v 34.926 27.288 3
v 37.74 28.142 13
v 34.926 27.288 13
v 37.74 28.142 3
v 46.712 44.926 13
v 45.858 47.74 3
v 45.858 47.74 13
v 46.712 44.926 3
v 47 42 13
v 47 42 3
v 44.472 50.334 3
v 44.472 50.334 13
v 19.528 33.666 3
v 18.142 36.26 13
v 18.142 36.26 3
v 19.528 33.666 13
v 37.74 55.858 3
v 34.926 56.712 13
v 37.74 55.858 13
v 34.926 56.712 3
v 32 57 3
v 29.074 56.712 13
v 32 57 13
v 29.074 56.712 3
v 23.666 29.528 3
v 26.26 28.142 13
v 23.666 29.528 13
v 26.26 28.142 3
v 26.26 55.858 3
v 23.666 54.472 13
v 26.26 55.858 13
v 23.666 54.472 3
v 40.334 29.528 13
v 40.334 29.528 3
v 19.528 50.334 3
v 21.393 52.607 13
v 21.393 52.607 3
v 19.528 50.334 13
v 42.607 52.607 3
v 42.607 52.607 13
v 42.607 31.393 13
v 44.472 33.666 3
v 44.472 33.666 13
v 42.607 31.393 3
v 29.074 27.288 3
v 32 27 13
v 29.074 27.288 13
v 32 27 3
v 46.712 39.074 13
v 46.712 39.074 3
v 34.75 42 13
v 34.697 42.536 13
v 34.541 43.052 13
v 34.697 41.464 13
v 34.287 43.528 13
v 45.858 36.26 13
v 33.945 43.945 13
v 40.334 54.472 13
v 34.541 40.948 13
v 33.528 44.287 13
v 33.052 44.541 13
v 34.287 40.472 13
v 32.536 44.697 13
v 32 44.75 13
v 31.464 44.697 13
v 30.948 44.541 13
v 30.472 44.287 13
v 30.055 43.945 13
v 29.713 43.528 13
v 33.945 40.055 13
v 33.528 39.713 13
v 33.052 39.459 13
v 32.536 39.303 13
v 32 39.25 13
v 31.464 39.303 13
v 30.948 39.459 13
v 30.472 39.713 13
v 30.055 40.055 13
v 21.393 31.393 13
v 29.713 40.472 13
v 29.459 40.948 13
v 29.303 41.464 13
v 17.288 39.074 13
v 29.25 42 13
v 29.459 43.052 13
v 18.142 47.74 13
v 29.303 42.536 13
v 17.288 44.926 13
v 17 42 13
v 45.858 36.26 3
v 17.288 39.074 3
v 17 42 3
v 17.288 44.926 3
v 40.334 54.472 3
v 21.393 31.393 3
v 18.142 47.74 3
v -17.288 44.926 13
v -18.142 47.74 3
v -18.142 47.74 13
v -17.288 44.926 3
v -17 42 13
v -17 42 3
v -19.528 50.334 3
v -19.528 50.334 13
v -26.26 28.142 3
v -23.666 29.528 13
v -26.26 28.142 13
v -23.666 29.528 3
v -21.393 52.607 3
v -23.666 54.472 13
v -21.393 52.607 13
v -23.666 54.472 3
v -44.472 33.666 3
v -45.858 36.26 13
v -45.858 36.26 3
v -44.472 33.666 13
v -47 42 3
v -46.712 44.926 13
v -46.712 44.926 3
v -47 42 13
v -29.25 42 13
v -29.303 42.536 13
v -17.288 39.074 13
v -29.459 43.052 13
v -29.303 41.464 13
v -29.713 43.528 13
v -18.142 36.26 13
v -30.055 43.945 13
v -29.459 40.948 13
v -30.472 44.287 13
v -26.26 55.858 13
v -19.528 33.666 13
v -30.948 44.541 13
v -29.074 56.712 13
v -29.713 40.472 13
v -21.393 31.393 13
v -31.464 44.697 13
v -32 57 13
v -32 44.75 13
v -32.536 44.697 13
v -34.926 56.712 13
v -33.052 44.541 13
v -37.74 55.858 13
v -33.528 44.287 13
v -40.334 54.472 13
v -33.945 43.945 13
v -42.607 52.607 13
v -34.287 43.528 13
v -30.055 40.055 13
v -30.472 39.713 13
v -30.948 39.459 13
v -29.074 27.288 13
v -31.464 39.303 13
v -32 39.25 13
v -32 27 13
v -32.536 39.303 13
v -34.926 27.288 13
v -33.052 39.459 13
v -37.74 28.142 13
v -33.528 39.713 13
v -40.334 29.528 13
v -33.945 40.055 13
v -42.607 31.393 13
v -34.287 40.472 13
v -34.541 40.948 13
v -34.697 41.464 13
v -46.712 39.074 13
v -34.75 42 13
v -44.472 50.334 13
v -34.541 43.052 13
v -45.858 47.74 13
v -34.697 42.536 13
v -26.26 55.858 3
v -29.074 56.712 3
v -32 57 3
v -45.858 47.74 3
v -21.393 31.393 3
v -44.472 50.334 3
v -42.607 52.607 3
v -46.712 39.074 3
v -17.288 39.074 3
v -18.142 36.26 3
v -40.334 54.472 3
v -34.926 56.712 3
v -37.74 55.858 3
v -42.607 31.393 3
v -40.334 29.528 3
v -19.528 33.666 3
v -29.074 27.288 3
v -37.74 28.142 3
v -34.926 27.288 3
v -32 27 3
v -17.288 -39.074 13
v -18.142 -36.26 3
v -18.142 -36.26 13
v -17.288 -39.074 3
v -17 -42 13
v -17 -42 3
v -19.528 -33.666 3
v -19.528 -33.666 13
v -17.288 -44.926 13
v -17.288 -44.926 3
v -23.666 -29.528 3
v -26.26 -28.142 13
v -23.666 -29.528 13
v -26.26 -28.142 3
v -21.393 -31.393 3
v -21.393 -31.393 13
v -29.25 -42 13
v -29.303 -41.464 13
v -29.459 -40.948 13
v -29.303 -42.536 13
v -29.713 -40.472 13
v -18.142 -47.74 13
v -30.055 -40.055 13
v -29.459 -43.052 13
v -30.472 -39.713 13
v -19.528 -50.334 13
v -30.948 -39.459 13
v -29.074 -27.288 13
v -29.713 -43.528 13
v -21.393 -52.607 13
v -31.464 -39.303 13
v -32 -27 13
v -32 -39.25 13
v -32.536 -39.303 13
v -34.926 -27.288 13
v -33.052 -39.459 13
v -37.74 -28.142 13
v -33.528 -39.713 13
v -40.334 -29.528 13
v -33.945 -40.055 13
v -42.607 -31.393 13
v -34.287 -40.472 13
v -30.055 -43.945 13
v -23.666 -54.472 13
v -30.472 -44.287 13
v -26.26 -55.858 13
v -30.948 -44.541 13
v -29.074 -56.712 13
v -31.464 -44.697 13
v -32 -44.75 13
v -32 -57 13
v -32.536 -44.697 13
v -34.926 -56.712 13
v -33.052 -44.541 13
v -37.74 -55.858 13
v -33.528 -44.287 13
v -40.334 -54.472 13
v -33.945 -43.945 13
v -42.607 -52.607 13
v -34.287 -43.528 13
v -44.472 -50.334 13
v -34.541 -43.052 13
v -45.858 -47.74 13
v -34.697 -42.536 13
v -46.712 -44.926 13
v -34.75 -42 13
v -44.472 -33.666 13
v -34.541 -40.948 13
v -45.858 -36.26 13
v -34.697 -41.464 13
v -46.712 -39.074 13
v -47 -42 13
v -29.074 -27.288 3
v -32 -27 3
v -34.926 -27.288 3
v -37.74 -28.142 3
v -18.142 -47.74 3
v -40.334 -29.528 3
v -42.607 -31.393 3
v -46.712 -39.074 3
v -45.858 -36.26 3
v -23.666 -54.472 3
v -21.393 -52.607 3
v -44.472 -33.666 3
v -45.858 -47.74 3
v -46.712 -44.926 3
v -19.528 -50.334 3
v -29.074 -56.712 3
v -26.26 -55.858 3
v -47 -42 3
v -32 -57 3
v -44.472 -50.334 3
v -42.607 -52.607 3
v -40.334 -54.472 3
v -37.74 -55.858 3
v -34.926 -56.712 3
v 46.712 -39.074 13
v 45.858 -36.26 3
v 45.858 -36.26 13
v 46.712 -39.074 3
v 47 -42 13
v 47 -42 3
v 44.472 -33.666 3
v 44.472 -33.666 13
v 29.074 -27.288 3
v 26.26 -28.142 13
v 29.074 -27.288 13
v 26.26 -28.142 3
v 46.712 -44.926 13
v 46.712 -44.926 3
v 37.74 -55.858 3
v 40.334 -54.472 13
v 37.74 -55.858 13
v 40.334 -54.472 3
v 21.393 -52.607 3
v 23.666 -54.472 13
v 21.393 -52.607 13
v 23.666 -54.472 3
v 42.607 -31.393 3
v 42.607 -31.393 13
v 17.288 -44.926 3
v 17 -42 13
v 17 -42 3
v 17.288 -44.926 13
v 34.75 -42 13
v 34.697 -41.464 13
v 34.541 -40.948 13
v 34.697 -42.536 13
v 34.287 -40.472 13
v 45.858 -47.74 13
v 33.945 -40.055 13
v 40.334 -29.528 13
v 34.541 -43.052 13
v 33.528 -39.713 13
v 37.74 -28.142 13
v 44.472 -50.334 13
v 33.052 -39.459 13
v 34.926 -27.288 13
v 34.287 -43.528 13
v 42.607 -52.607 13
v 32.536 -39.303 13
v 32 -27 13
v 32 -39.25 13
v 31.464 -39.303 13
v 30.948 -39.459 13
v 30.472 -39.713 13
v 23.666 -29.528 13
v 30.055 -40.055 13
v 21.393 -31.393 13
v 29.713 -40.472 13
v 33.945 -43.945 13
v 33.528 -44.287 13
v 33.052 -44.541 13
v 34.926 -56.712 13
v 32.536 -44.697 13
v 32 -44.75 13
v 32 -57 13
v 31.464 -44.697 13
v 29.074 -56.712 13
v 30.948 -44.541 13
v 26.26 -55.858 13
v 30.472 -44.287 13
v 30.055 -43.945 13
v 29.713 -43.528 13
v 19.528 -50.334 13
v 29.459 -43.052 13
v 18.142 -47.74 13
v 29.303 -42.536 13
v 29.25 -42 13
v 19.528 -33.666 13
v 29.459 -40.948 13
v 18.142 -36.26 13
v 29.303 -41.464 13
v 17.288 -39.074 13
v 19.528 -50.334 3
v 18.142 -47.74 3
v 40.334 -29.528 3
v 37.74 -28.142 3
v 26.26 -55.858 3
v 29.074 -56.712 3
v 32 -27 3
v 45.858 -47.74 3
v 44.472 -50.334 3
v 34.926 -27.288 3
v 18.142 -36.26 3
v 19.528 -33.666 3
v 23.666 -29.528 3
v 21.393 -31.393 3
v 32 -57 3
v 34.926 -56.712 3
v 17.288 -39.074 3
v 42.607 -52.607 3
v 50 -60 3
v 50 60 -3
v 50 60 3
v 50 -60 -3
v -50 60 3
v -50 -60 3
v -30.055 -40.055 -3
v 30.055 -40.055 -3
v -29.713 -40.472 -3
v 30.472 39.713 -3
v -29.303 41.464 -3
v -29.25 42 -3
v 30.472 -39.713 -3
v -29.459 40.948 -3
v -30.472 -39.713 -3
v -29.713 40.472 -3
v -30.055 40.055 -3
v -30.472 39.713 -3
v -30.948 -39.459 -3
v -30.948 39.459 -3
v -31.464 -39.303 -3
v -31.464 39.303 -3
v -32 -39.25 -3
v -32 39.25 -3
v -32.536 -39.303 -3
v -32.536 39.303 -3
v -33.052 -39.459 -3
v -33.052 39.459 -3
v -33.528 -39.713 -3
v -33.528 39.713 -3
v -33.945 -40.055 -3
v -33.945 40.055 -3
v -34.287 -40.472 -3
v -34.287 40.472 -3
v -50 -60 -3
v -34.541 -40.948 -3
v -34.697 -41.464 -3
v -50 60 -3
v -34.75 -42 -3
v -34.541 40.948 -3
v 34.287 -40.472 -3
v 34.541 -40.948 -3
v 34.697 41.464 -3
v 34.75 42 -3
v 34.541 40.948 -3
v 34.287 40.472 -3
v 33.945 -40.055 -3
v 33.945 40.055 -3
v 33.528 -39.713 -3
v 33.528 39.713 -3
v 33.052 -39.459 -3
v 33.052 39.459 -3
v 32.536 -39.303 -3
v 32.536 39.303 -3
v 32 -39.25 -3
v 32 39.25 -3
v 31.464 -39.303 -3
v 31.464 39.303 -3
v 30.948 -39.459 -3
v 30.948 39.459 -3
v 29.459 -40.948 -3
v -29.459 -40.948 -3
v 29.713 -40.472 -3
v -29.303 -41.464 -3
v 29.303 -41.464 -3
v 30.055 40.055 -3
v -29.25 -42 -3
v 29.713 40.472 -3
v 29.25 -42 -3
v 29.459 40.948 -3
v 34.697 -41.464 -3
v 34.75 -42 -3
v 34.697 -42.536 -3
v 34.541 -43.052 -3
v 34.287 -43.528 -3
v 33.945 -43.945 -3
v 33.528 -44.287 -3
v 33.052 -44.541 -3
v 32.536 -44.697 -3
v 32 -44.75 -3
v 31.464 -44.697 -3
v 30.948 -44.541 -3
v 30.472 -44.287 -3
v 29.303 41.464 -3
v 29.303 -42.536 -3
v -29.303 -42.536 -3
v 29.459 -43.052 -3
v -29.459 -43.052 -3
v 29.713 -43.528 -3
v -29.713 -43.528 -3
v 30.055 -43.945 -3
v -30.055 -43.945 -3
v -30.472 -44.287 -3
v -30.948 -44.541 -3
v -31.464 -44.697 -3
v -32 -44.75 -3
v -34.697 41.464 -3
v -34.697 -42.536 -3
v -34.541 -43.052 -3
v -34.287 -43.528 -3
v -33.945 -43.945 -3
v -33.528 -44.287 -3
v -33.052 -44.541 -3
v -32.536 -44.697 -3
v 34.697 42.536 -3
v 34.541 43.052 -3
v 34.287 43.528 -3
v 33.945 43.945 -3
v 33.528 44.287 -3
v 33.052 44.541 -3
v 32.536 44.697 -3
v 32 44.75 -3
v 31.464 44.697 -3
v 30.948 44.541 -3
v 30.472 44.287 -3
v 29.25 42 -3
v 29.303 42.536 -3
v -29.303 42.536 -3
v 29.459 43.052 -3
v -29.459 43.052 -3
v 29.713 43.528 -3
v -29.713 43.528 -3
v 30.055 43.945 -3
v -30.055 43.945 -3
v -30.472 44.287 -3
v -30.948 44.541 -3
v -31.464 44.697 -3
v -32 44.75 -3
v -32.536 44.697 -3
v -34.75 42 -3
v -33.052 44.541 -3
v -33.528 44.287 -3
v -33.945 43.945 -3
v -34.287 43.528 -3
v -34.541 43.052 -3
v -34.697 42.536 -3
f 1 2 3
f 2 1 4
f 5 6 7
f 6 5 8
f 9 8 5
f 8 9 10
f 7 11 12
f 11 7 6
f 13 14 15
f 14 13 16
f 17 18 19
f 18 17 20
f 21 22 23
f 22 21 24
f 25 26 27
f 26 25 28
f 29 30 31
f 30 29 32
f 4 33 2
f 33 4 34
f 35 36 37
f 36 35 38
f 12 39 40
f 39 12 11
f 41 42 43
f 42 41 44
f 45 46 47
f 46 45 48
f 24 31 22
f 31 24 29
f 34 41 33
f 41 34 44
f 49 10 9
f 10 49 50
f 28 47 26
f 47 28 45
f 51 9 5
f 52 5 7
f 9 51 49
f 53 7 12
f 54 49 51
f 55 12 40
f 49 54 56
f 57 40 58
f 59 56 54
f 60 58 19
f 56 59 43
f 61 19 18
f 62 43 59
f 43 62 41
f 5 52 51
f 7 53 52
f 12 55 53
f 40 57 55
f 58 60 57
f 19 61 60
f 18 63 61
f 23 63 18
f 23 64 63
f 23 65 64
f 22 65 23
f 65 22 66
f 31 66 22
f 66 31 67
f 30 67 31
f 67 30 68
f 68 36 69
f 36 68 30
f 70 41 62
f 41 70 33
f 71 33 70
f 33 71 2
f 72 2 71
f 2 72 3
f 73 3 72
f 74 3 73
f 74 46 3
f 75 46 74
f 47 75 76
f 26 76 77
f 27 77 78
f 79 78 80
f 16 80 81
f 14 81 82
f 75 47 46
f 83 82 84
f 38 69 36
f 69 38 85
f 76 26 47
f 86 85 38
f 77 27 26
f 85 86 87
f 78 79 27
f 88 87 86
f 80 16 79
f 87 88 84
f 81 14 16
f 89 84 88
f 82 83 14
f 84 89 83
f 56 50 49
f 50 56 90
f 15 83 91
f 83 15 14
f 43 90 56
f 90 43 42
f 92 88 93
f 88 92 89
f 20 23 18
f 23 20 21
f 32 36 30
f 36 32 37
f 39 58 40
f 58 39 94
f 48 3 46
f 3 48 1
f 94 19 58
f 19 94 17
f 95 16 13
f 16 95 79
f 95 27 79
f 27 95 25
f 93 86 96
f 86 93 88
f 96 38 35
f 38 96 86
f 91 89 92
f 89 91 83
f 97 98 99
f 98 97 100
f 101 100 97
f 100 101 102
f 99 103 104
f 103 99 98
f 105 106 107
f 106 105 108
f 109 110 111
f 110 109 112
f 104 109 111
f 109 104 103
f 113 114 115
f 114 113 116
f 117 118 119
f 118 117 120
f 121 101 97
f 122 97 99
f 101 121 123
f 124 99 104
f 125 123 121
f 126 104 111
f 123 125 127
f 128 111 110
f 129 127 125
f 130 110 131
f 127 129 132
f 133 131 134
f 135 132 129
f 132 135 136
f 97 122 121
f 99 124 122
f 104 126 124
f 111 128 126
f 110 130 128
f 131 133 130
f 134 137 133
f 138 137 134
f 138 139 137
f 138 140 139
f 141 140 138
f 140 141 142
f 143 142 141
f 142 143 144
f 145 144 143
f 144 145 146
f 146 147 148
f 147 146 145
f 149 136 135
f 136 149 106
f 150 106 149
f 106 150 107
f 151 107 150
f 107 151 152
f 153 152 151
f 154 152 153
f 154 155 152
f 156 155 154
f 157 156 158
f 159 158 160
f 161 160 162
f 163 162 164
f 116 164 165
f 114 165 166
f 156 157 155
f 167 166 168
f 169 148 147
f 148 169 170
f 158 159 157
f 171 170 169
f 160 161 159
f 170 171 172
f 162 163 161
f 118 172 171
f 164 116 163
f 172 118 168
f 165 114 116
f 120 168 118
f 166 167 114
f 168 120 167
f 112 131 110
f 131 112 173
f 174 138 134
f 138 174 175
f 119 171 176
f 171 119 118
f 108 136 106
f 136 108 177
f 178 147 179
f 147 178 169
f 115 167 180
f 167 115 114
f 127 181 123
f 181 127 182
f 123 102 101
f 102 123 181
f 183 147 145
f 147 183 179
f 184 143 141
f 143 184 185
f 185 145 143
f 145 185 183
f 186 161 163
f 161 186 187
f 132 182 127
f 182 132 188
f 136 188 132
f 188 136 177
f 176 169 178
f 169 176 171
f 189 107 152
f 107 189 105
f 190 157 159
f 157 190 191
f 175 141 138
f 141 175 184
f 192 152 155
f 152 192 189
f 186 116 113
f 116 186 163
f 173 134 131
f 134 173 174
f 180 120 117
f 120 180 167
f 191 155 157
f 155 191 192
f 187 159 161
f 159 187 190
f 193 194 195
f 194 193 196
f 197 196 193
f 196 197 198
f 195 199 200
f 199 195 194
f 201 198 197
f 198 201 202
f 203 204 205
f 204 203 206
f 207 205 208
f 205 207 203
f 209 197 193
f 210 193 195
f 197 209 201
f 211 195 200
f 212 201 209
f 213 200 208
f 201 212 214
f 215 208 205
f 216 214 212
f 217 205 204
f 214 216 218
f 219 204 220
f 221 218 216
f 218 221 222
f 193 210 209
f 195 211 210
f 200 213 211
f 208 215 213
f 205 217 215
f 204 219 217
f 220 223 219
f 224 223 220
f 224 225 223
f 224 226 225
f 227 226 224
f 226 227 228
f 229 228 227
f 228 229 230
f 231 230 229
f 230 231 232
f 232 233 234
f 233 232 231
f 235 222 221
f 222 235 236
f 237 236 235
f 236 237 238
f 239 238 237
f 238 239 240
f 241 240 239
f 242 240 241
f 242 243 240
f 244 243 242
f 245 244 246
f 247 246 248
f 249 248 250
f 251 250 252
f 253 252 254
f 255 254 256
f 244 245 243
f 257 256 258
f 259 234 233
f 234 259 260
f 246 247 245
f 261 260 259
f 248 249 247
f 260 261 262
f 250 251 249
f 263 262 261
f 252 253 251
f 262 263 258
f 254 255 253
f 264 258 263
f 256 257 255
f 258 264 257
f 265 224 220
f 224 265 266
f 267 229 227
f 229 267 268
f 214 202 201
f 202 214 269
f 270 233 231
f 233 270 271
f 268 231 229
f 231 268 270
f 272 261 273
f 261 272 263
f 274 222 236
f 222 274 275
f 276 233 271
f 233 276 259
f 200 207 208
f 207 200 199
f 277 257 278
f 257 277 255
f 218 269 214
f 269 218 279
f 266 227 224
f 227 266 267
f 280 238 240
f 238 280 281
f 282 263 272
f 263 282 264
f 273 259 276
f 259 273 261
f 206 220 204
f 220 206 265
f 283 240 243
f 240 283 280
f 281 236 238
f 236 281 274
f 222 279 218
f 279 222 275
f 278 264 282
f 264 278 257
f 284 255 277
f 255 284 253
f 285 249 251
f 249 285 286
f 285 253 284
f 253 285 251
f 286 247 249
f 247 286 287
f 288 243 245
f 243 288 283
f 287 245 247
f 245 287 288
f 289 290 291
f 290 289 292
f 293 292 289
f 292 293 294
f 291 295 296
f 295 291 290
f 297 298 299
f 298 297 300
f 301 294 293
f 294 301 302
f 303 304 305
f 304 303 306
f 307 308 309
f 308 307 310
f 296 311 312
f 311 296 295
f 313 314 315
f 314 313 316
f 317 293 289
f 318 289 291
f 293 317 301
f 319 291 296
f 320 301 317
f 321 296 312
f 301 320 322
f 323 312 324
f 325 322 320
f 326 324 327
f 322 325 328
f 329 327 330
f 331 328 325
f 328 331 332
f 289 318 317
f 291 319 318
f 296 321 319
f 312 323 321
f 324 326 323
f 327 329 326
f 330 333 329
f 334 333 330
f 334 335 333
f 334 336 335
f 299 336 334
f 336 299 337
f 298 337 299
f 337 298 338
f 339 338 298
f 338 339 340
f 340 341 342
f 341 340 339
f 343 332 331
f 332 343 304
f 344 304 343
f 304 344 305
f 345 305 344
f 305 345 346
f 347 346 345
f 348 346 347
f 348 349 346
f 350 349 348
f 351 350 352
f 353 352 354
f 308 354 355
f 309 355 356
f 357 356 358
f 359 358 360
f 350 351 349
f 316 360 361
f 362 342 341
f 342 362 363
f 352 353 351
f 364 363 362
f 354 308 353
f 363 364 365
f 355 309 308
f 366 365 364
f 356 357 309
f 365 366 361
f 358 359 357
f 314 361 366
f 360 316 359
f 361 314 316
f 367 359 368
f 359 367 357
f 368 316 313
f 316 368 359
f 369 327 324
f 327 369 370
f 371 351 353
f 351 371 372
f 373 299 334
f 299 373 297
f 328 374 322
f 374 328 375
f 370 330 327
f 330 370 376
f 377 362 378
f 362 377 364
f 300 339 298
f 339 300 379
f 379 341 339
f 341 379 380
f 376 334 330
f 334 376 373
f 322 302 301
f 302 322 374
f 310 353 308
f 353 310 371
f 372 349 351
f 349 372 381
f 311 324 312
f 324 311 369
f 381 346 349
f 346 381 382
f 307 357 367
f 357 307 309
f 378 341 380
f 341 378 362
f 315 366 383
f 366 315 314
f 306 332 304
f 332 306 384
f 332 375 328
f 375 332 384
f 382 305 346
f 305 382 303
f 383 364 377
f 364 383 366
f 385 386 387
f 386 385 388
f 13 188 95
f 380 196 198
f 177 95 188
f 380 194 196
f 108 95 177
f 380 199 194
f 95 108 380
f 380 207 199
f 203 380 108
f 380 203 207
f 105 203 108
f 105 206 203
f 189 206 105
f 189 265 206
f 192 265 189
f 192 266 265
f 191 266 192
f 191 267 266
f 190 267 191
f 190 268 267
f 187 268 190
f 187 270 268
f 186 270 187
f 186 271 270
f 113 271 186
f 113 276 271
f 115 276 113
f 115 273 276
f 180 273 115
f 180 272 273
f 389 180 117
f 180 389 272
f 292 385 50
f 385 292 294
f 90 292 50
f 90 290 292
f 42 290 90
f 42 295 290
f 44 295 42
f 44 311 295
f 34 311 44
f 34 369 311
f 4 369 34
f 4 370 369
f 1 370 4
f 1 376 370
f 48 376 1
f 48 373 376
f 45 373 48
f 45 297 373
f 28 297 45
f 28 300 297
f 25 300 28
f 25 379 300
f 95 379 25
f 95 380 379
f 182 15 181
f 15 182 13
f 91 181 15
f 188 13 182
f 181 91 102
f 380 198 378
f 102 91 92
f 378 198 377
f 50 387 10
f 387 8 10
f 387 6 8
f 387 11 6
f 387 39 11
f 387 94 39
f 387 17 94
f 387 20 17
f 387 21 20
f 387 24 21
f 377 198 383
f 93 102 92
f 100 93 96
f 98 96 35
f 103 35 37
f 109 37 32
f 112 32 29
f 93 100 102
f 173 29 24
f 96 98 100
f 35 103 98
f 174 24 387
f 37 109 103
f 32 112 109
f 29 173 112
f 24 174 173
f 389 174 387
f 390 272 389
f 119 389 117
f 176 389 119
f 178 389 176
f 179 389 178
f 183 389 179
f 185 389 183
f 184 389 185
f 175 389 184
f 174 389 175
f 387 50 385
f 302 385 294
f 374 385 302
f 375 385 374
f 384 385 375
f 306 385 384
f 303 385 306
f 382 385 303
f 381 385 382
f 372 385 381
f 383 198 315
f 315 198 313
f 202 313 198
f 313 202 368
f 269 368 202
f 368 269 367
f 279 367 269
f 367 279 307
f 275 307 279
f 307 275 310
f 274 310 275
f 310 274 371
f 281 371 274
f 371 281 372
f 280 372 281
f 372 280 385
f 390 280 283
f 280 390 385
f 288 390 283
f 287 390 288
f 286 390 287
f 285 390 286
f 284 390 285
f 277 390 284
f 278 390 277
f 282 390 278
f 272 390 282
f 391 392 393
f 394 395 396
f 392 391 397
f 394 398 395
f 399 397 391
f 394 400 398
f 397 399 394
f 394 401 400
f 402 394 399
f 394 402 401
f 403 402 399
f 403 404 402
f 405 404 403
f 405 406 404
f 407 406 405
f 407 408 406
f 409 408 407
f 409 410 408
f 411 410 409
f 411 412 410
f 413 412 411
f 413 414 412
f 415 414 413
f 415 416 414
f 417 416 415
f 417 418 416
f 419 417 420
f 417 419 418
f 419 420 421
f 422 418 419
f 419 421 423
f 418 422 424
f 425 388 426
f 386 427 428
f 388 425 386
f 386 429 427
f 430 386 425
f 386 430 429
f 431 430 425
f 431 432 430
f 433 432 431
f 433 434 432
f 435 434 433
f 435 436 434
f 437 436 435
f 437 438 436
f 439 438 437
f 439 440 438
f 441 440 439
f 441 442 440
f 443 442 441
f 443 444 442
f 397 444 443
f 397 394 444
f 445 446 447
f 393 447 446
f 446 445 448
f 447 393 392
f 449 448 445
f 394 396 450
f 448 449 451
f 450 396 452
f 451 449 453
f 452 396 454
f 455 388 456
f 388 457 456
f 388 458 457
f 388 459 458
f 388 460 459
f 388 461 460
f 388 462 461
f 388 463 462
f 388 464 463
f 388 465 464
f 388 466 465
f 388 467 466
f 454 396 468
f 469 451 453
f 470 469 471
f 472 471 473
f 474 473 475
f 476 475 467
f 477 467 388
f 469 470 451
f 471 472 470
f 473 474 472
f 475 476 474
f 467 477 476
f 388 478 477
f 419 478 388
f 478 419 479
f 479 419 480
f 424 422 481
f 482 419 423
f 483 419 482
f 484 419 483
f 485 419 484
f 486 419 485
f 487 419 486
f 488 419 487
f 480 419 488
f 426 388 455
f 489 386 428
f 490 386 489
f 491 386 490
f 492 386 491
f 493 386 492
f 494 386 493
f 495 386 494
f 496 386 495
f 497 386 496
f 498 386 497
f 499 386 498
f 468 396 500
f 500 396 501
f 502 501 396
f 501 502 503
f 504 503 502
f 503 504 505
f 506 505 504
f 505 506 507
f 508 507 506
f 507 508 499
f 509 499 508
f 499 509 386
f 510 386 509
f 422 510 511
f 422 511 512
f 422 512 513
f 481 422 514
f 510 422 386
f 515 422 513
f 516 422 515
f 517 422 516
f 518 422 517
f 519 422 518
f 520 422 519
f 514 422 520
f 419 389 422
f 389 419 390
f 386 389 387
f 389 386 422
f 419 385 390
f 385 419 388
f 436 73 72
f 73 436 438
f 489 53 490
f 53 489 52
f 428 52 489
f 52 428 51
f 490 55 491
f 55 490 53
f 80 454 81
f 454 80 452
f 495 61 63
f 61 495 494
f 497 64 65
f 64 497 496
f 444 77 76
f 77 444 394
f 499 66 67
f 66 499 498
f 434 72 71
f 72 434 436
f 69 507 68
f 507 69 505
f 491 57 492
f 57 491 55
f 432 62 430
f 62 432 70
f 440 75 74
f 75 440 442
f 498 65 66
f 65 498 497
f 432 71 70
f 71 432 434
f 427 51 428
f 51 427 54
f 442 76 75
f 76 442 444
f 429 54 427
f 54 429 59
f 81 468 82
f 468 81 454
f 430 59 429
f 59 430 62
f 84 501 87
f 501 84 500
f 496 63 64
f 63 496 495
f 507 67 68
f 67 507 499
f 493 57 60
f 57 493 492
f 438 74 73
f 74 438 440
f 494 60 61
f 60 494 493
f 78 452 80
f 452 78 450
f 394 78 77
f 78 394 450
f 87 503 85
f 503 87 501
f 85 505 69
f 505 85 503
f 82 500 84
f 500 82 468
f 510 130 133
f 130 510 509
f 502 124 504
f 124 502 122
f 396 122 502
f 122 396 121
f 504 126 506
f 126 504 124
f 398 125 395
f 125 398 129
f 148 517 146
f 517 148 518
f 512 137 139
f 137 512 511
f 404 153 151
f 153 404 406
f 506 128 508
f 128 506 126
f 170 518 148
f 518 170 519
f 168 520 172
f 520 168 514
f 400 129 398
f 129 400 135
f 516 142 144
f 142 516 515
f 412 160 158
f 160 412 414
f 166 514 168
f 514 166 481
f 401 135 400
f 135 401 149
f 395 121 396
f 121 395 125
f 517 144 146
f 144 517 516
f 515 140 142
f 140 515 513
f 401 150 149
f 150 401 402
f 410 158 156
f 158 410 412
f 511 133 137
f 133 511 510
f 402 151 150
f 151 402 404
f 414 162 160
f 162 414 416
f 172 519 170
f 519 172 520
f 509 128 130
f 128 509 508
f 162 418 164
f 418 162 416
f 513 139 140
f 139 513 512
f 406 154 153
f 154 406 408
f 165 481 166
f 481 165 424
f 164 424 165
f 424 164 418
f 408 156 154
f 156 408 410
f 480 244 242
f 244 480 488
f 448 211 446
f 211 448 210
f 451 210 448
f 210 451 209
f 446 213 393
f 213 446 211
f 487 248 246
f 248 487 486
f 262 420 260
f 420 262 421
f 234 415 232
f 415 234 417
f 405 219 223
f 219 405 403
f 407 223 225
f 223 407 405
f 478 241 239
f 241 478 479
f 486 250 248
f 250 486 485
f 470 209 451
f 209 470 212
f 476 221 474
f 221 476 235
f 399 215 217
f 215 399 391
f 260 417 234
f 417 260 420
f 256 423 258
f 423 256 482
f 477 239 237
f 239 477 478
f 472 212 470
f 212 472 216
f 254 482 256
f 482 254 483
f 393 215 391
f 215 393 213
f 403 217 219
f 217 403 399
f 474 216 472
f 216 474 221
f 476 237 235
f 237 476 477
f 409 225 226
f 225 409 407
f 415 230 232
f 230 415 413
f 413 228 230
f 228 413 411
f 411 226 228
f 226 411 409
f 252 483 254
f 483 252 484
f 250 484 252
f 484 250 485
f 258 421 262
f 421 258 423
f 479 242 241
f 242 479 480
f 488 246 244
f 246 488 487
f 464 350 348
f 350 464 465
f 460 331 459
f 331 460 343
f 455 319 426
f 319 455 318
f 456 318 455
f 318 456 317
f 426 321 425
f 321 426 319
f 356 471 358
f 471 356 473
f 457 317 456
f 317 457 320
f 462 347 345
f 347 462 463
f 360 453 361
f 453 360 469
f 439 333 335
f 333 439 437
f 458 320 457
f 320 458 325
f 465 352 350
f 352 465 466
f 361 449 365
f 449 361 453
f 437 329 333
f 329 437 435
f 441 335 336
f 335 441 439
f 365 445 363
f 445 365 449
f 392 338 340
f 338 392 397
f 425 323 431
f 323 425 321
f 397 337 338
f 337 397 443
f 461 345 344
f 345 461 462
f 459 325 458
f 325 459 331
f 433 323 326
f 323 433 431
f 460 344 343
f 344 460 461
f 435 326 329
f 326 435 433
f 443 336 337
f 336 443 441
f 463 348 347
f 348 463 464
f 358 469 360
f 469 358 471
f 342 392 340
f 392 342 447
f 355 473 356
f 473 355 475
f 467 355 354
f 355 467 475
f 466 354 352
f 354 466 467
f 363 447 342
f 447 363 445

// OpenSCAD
$fn = 32;

// ----------------------------------------------------------------------
// Anchor pads 100 x 120 x 16
// four corner bosses with anchor holes
// ----------------------------------------------------------------------

// --- parameters (mm) ---
plate = [100, 120, 6];  // base plate size (x, y, z)
pads = 4;               // boss count, one per corner
edge = 18;              // boss centre offset from the plate edge
boss_d = 30;            // boss diameter
boss_h = 10;            // boss height above the base plate
hole_d = 5.5;           // hole diameter

// --- derived feature positions (mm) ---
height = plate[2] + boss_h;      // = 16   overall height of the part
corner_x = plate[0] / 2 - edge;  // = 32   boss centre X
corner_y = plate[1] / 2 - edge;  // = 42   boss centre Y
feature_centers = [
  [corner_x, corner_y],
  [-corner_x, corner_y],
  [-corner_x, -corner_y],
  [corner_x, -corner_y]
];   // boss centres, anchor holes are drilled there

// base plate, four bosses standing on it, anchor holes all the way through
difference() {
  union() {
    cube(plate, center = true);
    for (centre = feature_centers)
      translate([centre[0], centre[1], plate[2] / 2 - 1])
        cylinder(d = boss_d, h = boss_h + 1);
  }
  for (centre = feature_centers)
    translate([centre[0], centre[1], -height])
      cylinder(d = hole_d, h = 2 * height + 2);  // through boss and plate
}
